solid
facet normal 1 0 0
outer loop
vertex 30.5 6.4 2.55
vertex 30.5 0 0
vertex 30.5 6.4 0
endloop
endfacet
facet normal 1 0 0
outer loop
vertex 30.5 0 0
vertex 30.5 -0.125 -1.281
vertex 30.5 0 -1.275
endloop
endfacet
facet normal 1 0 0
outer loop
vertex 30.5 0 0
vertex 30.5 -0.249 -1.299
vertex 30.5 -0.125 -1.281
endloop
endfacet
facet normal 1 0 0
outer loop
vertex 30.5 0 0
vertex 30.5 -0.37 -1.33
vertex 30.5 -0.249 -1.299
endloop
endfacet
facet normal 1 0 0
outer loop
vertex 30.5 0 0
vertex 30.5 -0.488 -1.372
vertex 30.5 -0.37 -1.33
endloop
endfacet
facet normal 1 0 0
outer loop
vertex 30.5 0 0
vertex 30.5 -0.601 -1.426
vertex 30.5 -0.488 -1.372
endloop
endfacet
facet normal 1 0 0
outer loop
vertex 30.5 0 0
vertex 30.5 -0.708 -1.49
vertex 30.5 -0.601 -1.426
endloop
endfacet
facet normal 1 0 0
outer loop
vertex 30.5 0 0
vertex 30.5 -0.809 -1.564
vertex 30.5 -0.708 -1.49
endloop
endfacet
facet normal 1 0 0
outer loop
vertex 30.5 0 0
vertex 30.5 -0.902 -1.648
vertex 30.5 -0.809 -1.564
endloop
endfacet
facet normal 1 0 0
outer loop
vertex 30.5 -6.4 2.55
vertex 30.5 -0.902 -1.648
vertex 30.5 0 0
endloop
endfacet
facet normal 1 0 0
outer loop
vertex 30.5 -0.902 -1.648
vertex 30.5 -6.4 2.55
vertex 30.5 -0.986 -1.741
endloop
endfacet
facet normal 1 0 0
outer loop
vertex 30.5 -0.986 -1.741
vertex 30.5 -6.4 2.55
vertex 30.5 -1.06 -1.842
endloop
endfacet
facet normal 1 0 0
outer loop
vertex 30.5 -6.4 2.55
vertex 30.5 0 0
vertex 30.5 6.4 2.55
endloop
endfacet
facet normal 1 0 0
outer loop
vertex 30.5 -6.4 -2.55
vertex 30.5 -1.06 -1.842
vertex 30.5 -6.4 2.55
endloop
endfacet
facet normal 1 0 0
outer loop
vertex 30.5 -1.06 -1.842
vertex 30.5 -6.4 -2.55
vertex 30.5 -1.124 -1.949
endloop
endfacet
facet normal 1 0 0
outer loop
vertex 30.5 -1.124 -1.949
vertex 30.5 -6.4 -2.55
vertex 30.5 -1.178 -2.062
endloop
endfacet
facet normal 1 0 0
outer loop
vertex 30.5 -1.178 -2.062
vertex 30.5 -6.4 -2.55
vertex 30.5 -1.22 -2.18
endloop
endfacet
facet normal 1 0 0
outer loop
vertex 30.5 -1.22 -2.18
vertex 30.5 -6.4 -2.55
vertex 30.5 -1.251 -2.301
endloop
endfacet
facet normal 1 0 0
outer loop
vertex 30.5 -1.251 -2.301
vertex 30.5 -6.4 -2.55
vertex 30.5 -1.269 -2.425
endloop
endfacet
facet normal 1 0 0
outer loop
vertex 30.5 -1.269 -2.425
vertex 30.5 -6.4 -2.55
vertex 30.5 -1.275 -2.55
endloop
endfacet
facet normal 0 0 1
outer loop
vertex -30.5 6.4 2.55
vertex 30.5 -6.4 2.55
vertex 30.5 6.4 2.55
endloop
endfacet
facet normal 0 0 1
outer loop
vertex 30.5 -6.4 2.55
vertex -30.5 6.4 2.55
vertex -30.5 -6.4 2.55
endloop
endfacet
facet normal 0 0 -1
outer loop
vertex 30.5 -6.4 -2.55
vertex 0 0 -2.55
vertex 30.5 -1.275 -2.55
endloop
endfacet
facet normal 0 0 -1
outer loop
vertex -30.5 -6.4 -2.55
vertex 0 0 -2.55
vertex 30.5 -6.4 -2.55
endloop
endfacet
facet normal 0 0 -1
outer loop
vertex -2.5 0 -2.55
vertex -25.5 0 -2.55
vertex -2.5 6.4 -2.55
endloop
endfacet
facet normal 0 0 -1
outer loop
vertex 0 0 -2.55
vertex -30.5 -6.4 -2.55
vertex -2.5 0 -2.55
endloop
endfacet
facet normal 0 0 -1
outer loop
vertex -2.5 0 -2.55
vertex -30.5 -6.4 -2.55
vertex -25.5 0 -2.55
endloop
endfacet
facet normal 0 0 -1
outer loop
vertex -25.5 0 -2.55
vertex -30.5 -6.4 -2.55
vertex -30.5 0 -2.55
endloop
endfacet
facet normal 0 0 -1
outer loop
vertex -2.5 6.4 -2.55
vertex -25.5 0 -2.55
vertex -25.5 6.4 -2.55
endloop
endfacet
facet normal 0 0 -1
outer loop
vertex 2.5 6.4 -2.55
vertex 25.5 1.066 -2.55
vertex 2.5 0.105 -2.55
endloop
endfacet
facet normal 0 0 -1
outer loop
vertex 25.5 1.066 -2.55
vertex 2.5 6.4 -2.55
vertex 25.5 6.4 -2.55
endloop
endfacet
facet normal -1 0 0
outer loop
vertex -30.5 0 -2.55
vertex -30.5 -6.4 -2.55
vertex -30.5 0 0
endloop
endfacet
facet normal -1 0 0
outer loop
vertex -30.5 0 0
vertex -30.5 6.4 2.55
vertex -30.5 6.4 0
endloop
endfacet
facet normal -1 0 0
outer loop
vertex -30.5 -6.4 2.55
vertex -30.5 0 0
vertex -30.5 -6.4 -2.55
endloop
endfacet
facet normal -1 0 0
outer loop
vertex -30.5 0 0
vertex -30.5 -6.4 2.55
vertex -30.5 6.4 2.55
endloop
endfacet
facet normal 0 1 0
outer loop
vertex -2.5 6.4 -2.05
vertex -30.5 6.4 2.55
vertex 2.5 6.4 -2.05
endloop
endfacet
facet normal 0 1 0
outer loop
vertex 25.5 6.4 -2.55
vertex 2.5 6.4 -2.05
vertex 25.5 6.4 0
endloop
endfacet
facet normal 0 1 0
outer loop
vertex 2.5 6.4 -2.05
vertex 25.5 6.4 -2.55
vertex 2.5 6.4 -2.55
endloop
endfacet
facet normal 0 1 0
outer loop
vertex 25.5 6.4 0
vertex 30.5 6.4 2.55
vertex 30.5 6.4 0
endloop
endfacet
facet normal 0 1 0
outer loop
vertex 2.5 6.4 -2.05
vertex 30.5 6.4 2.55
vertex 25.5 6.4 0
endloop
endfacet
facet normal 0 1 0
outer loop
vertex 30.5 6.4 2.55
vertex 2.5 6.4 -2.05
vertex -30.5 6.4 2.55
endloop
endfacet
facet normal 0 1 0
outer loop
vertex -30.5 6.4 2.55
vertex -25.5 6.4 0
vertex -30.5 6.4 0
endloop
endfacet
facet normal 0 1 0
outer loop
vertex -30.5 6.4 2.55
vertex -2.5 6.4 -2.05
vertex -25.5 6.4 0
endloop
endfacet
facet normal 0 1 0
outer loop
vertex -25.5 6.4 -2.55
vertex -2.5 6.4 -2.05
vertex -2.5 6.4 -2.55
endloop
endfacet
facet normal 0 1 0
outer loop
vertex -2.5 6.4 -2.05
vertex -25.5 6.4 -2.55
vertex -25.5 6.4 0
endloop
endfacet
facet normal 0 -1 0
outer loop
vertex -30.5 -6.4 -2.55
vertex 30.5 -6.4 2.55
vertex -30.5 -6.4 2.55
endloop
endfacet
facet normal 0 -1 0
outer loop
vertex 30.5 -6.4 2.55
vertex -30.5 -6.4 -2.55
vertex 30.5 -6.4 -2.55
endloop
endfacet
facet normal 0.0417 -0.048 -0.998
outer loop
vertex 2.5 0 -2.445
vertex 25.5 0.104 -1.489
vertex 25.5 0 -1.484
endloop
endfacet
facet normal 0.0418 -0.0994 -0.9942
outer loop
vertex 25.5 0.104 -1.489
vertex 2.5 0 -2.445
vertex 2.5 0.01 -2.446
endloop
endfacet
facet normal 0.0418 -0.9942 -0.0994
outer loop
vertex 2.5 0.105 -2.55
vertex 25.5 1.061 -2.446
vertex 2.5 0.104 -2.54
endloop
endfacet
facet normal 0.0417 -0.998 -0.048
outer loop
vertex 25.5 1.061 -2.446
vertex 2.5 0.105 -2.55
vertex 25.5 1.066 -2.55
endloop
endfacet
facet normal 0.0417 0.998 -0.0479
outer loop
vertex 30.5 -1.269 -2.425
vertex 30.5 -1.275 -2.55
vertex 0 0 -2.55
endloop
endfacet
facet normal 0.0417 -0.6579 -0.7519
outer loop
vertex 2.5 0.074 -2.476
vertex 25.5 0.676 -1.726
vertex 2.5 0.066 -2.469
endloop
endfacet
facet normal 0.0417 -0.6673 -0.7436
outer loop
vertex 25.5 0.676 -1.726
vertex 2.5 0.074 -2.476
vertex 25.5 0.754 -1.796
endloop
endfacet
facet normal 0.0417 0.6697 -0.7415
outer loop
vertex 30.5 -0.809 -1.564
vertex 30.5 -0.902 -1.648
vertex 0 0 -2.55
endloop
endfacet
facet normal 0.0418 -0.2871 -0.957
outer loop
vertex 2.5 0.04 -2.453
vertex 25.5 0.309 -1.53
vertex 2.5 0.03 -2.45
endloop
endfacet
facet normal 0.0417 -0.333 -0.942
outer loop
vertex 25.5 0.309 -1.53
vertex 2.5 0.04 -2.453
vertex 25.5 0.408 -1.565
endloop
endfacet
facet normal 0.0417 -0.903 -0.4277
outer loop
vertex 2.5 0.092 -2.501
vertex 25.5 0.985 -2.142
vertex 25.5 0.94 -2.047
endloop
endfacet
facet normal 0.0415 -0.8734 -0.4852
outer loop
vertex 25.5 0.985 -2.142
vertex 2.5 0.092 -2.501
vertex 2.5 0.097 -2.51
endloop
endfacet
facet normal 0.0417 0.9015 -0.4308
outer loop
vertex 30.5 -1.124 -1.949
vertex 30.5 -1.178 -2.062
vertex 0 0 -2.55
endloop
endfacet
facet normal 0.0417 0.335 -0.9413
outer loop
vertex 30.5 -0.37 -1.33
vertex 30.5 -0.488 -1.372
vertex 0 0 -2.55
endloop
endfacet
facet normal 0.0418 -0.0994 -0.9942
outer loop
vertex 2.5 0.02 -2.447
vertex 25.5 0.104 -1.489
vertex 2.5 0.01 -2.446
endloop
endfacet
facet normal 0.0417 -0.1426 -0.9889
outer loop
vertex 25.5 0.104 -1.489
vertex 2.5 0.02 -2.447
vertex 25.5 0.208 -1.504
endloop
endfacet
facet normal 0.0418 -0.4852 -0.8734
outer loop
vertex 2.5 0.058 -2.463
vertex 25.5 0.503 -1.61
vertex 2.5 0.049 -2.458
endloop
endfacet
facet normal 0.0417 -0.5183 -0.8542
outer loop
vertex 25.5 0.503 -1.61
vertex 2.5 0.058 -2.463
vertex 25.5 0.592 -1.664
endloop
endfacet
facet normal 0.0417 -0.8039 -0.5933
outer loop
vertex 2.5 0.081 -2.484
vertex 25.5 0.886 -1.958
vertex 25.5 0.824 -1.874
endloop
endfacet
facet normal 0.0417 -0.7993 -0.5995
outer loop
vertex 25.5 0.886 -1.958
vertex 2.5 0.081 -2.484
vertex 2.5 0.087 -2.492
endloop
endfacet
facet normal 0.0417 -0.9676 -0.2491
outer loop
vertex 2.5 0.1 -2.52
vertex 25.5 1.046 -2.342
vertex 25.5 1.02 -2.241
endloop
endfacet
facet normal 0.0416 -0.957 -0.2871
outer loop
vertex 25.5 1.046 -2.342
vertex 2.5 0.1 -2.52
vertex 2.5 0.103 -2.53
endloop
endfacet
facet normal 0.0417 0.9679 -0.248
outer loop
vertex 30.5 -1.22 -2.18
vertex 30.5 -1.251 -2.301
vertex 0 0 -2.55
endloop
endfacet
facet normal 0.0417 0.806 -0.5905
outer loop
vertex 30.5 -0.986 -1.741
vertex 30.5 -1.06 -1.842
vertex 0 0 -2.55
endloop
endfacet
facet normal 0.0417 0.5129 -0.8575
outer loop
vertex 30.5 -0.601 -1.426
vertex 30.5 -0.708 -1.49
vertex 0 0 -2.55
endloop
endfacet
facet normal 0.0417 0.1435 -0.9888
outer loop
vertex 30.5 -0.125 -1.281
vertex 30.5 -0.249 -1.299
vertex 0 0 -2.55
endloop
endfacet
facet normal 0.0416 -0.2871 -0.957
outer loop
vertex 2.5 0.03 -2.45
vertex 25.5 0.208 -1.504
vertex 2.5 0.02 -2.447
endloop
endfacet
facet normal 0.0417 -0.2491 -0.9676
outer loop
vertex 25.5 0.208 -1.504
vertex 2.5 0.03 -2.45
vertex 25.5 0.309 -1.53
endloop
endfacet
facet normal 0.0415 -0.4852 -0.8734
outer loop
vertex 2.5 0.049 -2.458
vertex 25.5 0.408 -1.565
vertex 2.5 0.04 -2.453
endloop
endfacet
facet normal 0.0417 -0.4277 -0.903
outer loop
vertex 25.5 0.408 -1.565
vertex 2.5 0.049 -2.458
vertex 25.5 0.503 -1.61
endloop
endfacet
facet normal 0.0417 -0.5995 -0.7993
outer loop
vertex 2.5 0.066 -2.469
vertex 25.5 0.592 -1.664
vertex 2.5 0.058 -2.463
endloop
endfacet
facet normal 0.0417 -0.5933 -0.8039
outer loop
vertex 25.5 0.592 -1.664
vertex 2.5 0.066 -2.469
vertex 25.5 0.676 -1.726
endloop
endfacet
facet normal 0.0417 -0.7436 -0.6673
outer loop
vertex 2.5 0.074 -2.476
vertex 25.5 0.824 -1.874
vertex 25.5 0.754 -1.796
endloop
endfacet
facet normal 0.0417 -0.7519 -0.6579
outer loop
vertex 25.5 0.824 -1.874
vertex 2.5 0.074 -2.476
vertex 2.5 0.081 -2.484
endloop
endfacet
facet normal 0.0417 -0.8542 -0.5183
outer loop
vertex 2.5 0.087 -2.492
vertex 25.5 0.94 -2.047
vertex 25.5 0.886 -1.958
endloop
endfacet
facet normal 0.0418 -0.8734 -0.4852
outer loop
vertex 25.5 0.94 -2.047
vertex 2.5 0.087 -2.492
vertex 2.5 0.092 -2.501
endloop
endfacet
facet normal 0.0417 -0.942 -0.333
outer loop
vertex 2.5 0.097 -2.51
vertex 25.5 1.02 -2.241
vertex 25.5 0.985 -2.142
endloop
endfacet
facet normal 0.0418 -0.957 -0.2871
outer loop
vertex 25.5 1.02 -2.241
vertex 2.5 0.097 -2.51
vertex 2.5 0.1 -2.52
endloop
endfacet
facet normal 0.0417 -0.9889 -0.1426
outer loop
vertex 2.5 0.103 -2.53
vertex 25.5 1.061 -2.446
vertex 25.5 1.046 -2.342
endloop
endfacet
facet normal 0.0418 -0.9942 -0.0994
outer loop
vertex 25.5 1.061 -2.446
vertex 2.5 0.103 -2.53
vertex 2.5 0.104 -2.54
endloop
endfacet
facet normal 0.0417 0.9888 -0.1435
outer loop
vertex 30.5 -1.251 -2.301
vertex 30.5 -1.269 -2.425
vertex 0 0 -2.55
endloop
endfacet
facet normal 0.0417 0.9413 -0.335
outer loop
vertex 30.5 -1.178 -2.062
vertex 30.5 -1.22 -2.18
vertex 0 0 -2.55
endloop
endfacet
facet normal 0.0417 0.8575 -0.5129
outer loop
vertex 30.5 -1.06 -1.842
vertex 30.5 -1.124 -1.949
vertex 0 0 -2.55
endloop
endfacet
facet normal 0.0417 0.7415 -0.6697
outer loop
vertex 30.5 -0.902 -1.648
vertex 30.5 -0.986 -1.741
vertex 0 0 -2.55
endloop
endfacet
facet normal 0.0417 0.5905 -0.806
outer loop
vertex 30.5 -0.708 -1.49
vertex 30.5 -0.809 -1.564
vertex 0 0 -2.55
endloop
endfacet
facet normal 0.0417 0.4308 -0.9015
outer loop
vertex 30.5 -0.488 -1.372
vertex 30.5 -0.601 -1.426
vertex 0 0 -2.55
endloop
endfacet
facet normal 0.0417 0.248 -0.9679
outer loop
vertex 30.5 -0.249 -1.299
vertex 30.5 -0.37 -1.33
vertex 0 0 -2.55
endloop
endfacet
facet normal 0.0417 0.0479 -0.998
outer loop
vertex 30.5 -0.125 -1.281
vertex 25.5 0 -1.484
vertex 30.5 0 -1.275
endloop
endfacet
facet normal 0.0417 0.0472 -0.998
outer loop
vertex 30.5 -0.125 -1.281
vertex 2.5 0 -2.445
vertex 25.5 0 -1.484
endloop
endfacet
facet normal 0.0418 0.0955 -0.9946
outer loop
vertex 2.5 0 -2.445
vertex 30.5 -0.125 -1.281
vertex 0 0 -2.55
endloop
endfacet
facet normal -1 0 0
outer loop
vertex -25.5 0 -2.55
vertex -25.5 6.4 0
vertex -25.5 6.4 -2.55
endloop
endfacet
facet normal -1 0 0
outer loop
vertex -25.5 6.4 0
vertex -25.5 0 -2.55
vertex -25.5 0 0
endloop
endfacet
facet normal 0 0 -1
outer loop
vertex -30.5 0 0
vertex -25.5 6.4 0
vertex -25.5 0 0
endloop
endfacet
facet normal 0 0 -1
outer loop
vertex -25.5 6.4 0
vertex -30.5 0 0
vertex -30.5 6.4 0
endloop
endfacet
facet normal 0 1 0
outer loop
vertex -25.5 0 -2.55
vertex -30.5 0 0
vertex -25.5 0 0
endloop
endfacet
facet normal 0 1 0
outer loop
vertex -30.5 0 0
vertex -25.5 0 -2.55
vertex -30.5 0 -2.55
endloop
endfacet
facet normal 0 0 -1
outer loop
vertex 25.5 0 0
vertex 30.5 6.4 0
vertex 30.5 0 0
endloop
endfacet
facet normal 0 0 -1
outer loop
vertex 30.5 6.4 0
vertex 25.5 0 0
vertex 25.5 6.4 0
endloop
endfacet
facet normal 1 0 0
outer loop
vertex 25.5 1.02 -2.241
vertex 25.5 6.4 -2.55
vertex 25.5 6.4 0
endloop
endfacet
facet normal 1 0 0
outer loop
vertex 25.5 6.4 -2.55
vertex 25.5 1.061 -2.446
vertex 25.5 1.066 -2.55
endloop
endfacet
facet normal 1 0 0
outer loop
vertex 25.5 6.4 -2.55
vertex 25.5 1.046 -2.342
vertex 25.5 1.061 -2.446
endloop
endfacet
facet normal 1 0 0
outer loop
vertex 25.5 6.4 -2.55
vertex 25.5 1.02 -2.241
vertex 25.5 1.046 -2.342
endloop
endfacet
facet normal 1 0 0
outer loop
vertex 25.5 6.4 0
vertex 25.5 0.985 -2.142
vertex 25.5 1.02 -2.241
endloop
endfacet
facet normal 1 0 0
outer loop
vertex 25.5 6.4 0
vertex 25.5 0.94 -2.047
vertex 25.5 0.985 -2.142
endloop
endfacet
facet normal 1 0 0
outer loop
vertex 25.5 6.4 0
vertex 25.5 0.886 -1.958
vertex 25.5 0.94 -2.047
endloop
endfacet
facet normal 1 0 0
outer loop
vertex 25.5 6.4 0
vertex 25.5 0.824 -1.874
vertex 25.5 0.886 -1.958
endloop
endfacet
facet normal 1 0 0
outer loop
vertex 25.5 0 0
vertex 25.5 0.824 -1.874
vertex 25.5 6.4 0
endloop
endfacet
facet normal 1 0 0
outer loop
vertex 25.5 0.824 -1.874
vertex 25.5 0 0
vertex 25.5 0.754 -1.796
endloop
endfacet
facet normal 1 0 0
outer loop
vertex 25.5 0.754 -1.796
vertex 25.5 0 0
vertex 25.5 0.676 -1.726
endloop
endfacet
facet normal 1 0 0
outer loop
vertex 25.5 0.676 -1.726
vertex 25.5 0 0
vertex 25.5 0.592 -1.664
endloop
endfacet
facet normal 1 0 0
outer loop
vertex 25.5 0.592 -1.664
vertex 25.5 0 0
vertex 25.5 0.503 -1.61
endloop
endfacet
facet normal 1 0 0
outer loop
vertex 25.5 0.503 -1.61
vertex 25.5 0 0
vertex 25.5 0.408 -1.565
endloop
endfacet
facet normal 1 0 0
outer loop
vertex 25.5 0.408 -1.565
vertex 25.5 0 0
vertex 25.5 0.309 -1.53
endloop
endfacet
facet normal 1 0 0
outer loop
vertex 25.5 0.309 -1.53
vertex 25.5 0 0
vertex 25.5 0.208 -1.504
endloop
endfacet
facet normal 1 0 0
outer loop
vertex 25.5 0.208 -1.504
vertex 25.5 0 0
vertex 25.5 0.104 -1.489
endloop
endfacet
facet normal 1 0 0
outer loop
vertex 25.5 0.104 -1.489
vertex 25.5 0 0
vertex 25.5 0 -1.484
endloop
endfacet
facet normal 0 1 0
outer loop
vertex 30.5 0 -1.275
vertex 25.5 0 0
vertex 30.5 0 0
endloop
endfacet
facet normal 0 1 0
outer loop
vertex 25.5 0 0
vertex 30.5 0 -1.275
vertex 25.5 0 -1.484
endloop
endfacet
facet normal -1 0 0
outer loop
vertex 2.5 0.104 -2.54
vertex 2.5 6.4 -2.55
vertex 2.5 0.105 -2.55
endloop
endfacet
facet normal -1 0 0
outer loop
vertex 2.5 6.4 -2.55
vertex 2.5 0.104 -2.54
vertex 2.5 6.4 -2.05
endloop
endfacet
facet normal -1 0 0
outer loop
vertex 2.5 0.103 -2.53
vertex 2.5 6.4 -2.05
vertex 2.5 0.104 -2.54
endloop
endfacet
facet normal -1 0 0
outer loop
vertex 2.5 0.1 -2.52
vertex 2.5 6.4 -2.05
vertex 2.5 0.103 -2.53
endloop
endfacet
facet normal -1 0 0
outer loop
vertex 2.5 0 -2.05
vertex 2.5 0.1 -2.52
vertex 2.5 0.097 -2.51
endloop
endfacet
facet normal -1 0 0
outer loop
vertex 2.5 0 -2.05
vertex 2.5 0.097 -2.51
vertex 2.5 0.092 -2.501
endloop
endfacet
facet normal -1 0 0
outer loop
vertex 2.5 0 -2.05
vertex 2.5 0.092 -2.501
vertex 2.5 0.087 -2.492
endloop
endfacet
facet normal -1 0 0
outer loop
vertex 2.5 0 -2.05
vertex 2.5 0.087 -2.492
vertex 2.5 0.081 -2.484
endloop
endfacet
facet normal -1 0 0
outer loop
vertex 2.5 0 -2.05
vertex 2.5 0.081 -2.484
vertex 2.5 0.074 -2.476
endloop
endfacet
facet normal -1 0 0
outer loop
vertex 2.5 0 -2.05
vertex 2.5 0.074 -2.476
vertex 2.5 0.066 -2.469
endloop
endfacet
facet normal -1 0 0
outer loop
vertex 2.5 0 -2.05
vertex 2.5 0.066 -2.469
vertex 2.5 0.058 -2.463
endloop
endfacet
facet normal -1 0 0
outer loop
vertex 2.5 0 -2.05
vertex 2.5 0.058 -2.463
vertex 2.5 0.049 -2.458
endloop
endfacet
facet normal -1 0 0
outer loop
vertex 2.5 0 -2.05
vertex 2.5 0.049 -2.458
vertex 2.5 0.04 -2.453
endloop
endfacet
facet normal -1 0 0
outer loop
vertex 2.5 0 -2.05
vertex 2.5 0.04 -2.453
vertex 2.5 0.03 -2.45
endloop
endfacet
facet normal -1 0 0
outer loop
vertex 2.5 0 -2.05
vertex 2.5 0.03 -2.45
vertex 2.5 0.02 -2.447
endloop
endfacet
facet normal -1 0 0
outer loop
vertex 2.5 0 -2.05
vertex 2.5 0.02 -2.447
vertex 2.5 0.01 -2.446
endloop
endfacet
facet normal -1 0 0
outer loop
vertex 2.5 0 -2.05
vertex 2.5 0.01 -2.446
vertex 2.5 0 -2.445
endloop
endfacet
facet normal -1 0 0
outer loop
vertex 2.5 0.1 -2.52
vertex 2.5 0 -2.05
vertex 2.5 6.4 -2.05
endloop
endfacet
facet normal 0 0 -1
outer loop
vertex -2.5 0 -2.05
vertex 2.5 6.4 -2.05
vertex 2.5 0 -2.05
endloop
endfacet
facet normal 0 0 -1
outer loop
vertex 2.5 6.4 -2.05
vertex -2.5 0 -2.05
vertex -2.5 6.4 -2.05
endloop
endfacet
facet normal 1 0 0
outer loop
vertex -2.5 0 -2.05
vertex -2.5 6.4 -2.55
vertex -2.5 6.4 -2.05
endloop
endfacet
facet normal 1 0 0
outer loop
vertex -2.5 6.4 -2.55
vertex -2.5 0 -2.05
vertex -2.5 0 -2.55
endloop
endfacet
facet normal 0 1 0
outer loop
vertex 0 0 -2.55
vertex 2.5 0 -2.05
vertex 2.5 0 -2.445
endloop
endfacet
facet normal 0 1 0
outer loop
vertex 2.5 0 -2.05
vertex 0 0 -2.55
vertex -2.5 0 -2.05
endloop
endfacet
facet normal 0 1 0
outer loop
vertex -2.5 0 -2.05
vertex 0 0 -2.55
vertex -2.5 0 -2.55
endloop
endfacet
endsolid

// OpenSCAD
module v_shaped_strip() {
    difference() {
        // Main body of the strip
        cube([61.0, 12.8, 5.1], center=true);
        
        // Create the V-shaped profile
        translate([0, 0, -2.55])
        rotate([0, 90, 0])
        cylinder(h=61.0, r1=0, r2=2.55, $fn=64);
        
        // Create the end steps/shoulders
        translate([-30.5, 0, -2.55])
        cube([5.0, 12.8, 2.55], center=false);
        
        translate([25.5, 0, -2.55])
        cube([5.0, 12.8, 2.55], center=false);
        
        // Create the mid-length seam/transition
        translate([-2.5, 0, -2.55])
        cube([5.0, 12.8, 0.5], center=false);
    }
}

v_shaped_strip();
